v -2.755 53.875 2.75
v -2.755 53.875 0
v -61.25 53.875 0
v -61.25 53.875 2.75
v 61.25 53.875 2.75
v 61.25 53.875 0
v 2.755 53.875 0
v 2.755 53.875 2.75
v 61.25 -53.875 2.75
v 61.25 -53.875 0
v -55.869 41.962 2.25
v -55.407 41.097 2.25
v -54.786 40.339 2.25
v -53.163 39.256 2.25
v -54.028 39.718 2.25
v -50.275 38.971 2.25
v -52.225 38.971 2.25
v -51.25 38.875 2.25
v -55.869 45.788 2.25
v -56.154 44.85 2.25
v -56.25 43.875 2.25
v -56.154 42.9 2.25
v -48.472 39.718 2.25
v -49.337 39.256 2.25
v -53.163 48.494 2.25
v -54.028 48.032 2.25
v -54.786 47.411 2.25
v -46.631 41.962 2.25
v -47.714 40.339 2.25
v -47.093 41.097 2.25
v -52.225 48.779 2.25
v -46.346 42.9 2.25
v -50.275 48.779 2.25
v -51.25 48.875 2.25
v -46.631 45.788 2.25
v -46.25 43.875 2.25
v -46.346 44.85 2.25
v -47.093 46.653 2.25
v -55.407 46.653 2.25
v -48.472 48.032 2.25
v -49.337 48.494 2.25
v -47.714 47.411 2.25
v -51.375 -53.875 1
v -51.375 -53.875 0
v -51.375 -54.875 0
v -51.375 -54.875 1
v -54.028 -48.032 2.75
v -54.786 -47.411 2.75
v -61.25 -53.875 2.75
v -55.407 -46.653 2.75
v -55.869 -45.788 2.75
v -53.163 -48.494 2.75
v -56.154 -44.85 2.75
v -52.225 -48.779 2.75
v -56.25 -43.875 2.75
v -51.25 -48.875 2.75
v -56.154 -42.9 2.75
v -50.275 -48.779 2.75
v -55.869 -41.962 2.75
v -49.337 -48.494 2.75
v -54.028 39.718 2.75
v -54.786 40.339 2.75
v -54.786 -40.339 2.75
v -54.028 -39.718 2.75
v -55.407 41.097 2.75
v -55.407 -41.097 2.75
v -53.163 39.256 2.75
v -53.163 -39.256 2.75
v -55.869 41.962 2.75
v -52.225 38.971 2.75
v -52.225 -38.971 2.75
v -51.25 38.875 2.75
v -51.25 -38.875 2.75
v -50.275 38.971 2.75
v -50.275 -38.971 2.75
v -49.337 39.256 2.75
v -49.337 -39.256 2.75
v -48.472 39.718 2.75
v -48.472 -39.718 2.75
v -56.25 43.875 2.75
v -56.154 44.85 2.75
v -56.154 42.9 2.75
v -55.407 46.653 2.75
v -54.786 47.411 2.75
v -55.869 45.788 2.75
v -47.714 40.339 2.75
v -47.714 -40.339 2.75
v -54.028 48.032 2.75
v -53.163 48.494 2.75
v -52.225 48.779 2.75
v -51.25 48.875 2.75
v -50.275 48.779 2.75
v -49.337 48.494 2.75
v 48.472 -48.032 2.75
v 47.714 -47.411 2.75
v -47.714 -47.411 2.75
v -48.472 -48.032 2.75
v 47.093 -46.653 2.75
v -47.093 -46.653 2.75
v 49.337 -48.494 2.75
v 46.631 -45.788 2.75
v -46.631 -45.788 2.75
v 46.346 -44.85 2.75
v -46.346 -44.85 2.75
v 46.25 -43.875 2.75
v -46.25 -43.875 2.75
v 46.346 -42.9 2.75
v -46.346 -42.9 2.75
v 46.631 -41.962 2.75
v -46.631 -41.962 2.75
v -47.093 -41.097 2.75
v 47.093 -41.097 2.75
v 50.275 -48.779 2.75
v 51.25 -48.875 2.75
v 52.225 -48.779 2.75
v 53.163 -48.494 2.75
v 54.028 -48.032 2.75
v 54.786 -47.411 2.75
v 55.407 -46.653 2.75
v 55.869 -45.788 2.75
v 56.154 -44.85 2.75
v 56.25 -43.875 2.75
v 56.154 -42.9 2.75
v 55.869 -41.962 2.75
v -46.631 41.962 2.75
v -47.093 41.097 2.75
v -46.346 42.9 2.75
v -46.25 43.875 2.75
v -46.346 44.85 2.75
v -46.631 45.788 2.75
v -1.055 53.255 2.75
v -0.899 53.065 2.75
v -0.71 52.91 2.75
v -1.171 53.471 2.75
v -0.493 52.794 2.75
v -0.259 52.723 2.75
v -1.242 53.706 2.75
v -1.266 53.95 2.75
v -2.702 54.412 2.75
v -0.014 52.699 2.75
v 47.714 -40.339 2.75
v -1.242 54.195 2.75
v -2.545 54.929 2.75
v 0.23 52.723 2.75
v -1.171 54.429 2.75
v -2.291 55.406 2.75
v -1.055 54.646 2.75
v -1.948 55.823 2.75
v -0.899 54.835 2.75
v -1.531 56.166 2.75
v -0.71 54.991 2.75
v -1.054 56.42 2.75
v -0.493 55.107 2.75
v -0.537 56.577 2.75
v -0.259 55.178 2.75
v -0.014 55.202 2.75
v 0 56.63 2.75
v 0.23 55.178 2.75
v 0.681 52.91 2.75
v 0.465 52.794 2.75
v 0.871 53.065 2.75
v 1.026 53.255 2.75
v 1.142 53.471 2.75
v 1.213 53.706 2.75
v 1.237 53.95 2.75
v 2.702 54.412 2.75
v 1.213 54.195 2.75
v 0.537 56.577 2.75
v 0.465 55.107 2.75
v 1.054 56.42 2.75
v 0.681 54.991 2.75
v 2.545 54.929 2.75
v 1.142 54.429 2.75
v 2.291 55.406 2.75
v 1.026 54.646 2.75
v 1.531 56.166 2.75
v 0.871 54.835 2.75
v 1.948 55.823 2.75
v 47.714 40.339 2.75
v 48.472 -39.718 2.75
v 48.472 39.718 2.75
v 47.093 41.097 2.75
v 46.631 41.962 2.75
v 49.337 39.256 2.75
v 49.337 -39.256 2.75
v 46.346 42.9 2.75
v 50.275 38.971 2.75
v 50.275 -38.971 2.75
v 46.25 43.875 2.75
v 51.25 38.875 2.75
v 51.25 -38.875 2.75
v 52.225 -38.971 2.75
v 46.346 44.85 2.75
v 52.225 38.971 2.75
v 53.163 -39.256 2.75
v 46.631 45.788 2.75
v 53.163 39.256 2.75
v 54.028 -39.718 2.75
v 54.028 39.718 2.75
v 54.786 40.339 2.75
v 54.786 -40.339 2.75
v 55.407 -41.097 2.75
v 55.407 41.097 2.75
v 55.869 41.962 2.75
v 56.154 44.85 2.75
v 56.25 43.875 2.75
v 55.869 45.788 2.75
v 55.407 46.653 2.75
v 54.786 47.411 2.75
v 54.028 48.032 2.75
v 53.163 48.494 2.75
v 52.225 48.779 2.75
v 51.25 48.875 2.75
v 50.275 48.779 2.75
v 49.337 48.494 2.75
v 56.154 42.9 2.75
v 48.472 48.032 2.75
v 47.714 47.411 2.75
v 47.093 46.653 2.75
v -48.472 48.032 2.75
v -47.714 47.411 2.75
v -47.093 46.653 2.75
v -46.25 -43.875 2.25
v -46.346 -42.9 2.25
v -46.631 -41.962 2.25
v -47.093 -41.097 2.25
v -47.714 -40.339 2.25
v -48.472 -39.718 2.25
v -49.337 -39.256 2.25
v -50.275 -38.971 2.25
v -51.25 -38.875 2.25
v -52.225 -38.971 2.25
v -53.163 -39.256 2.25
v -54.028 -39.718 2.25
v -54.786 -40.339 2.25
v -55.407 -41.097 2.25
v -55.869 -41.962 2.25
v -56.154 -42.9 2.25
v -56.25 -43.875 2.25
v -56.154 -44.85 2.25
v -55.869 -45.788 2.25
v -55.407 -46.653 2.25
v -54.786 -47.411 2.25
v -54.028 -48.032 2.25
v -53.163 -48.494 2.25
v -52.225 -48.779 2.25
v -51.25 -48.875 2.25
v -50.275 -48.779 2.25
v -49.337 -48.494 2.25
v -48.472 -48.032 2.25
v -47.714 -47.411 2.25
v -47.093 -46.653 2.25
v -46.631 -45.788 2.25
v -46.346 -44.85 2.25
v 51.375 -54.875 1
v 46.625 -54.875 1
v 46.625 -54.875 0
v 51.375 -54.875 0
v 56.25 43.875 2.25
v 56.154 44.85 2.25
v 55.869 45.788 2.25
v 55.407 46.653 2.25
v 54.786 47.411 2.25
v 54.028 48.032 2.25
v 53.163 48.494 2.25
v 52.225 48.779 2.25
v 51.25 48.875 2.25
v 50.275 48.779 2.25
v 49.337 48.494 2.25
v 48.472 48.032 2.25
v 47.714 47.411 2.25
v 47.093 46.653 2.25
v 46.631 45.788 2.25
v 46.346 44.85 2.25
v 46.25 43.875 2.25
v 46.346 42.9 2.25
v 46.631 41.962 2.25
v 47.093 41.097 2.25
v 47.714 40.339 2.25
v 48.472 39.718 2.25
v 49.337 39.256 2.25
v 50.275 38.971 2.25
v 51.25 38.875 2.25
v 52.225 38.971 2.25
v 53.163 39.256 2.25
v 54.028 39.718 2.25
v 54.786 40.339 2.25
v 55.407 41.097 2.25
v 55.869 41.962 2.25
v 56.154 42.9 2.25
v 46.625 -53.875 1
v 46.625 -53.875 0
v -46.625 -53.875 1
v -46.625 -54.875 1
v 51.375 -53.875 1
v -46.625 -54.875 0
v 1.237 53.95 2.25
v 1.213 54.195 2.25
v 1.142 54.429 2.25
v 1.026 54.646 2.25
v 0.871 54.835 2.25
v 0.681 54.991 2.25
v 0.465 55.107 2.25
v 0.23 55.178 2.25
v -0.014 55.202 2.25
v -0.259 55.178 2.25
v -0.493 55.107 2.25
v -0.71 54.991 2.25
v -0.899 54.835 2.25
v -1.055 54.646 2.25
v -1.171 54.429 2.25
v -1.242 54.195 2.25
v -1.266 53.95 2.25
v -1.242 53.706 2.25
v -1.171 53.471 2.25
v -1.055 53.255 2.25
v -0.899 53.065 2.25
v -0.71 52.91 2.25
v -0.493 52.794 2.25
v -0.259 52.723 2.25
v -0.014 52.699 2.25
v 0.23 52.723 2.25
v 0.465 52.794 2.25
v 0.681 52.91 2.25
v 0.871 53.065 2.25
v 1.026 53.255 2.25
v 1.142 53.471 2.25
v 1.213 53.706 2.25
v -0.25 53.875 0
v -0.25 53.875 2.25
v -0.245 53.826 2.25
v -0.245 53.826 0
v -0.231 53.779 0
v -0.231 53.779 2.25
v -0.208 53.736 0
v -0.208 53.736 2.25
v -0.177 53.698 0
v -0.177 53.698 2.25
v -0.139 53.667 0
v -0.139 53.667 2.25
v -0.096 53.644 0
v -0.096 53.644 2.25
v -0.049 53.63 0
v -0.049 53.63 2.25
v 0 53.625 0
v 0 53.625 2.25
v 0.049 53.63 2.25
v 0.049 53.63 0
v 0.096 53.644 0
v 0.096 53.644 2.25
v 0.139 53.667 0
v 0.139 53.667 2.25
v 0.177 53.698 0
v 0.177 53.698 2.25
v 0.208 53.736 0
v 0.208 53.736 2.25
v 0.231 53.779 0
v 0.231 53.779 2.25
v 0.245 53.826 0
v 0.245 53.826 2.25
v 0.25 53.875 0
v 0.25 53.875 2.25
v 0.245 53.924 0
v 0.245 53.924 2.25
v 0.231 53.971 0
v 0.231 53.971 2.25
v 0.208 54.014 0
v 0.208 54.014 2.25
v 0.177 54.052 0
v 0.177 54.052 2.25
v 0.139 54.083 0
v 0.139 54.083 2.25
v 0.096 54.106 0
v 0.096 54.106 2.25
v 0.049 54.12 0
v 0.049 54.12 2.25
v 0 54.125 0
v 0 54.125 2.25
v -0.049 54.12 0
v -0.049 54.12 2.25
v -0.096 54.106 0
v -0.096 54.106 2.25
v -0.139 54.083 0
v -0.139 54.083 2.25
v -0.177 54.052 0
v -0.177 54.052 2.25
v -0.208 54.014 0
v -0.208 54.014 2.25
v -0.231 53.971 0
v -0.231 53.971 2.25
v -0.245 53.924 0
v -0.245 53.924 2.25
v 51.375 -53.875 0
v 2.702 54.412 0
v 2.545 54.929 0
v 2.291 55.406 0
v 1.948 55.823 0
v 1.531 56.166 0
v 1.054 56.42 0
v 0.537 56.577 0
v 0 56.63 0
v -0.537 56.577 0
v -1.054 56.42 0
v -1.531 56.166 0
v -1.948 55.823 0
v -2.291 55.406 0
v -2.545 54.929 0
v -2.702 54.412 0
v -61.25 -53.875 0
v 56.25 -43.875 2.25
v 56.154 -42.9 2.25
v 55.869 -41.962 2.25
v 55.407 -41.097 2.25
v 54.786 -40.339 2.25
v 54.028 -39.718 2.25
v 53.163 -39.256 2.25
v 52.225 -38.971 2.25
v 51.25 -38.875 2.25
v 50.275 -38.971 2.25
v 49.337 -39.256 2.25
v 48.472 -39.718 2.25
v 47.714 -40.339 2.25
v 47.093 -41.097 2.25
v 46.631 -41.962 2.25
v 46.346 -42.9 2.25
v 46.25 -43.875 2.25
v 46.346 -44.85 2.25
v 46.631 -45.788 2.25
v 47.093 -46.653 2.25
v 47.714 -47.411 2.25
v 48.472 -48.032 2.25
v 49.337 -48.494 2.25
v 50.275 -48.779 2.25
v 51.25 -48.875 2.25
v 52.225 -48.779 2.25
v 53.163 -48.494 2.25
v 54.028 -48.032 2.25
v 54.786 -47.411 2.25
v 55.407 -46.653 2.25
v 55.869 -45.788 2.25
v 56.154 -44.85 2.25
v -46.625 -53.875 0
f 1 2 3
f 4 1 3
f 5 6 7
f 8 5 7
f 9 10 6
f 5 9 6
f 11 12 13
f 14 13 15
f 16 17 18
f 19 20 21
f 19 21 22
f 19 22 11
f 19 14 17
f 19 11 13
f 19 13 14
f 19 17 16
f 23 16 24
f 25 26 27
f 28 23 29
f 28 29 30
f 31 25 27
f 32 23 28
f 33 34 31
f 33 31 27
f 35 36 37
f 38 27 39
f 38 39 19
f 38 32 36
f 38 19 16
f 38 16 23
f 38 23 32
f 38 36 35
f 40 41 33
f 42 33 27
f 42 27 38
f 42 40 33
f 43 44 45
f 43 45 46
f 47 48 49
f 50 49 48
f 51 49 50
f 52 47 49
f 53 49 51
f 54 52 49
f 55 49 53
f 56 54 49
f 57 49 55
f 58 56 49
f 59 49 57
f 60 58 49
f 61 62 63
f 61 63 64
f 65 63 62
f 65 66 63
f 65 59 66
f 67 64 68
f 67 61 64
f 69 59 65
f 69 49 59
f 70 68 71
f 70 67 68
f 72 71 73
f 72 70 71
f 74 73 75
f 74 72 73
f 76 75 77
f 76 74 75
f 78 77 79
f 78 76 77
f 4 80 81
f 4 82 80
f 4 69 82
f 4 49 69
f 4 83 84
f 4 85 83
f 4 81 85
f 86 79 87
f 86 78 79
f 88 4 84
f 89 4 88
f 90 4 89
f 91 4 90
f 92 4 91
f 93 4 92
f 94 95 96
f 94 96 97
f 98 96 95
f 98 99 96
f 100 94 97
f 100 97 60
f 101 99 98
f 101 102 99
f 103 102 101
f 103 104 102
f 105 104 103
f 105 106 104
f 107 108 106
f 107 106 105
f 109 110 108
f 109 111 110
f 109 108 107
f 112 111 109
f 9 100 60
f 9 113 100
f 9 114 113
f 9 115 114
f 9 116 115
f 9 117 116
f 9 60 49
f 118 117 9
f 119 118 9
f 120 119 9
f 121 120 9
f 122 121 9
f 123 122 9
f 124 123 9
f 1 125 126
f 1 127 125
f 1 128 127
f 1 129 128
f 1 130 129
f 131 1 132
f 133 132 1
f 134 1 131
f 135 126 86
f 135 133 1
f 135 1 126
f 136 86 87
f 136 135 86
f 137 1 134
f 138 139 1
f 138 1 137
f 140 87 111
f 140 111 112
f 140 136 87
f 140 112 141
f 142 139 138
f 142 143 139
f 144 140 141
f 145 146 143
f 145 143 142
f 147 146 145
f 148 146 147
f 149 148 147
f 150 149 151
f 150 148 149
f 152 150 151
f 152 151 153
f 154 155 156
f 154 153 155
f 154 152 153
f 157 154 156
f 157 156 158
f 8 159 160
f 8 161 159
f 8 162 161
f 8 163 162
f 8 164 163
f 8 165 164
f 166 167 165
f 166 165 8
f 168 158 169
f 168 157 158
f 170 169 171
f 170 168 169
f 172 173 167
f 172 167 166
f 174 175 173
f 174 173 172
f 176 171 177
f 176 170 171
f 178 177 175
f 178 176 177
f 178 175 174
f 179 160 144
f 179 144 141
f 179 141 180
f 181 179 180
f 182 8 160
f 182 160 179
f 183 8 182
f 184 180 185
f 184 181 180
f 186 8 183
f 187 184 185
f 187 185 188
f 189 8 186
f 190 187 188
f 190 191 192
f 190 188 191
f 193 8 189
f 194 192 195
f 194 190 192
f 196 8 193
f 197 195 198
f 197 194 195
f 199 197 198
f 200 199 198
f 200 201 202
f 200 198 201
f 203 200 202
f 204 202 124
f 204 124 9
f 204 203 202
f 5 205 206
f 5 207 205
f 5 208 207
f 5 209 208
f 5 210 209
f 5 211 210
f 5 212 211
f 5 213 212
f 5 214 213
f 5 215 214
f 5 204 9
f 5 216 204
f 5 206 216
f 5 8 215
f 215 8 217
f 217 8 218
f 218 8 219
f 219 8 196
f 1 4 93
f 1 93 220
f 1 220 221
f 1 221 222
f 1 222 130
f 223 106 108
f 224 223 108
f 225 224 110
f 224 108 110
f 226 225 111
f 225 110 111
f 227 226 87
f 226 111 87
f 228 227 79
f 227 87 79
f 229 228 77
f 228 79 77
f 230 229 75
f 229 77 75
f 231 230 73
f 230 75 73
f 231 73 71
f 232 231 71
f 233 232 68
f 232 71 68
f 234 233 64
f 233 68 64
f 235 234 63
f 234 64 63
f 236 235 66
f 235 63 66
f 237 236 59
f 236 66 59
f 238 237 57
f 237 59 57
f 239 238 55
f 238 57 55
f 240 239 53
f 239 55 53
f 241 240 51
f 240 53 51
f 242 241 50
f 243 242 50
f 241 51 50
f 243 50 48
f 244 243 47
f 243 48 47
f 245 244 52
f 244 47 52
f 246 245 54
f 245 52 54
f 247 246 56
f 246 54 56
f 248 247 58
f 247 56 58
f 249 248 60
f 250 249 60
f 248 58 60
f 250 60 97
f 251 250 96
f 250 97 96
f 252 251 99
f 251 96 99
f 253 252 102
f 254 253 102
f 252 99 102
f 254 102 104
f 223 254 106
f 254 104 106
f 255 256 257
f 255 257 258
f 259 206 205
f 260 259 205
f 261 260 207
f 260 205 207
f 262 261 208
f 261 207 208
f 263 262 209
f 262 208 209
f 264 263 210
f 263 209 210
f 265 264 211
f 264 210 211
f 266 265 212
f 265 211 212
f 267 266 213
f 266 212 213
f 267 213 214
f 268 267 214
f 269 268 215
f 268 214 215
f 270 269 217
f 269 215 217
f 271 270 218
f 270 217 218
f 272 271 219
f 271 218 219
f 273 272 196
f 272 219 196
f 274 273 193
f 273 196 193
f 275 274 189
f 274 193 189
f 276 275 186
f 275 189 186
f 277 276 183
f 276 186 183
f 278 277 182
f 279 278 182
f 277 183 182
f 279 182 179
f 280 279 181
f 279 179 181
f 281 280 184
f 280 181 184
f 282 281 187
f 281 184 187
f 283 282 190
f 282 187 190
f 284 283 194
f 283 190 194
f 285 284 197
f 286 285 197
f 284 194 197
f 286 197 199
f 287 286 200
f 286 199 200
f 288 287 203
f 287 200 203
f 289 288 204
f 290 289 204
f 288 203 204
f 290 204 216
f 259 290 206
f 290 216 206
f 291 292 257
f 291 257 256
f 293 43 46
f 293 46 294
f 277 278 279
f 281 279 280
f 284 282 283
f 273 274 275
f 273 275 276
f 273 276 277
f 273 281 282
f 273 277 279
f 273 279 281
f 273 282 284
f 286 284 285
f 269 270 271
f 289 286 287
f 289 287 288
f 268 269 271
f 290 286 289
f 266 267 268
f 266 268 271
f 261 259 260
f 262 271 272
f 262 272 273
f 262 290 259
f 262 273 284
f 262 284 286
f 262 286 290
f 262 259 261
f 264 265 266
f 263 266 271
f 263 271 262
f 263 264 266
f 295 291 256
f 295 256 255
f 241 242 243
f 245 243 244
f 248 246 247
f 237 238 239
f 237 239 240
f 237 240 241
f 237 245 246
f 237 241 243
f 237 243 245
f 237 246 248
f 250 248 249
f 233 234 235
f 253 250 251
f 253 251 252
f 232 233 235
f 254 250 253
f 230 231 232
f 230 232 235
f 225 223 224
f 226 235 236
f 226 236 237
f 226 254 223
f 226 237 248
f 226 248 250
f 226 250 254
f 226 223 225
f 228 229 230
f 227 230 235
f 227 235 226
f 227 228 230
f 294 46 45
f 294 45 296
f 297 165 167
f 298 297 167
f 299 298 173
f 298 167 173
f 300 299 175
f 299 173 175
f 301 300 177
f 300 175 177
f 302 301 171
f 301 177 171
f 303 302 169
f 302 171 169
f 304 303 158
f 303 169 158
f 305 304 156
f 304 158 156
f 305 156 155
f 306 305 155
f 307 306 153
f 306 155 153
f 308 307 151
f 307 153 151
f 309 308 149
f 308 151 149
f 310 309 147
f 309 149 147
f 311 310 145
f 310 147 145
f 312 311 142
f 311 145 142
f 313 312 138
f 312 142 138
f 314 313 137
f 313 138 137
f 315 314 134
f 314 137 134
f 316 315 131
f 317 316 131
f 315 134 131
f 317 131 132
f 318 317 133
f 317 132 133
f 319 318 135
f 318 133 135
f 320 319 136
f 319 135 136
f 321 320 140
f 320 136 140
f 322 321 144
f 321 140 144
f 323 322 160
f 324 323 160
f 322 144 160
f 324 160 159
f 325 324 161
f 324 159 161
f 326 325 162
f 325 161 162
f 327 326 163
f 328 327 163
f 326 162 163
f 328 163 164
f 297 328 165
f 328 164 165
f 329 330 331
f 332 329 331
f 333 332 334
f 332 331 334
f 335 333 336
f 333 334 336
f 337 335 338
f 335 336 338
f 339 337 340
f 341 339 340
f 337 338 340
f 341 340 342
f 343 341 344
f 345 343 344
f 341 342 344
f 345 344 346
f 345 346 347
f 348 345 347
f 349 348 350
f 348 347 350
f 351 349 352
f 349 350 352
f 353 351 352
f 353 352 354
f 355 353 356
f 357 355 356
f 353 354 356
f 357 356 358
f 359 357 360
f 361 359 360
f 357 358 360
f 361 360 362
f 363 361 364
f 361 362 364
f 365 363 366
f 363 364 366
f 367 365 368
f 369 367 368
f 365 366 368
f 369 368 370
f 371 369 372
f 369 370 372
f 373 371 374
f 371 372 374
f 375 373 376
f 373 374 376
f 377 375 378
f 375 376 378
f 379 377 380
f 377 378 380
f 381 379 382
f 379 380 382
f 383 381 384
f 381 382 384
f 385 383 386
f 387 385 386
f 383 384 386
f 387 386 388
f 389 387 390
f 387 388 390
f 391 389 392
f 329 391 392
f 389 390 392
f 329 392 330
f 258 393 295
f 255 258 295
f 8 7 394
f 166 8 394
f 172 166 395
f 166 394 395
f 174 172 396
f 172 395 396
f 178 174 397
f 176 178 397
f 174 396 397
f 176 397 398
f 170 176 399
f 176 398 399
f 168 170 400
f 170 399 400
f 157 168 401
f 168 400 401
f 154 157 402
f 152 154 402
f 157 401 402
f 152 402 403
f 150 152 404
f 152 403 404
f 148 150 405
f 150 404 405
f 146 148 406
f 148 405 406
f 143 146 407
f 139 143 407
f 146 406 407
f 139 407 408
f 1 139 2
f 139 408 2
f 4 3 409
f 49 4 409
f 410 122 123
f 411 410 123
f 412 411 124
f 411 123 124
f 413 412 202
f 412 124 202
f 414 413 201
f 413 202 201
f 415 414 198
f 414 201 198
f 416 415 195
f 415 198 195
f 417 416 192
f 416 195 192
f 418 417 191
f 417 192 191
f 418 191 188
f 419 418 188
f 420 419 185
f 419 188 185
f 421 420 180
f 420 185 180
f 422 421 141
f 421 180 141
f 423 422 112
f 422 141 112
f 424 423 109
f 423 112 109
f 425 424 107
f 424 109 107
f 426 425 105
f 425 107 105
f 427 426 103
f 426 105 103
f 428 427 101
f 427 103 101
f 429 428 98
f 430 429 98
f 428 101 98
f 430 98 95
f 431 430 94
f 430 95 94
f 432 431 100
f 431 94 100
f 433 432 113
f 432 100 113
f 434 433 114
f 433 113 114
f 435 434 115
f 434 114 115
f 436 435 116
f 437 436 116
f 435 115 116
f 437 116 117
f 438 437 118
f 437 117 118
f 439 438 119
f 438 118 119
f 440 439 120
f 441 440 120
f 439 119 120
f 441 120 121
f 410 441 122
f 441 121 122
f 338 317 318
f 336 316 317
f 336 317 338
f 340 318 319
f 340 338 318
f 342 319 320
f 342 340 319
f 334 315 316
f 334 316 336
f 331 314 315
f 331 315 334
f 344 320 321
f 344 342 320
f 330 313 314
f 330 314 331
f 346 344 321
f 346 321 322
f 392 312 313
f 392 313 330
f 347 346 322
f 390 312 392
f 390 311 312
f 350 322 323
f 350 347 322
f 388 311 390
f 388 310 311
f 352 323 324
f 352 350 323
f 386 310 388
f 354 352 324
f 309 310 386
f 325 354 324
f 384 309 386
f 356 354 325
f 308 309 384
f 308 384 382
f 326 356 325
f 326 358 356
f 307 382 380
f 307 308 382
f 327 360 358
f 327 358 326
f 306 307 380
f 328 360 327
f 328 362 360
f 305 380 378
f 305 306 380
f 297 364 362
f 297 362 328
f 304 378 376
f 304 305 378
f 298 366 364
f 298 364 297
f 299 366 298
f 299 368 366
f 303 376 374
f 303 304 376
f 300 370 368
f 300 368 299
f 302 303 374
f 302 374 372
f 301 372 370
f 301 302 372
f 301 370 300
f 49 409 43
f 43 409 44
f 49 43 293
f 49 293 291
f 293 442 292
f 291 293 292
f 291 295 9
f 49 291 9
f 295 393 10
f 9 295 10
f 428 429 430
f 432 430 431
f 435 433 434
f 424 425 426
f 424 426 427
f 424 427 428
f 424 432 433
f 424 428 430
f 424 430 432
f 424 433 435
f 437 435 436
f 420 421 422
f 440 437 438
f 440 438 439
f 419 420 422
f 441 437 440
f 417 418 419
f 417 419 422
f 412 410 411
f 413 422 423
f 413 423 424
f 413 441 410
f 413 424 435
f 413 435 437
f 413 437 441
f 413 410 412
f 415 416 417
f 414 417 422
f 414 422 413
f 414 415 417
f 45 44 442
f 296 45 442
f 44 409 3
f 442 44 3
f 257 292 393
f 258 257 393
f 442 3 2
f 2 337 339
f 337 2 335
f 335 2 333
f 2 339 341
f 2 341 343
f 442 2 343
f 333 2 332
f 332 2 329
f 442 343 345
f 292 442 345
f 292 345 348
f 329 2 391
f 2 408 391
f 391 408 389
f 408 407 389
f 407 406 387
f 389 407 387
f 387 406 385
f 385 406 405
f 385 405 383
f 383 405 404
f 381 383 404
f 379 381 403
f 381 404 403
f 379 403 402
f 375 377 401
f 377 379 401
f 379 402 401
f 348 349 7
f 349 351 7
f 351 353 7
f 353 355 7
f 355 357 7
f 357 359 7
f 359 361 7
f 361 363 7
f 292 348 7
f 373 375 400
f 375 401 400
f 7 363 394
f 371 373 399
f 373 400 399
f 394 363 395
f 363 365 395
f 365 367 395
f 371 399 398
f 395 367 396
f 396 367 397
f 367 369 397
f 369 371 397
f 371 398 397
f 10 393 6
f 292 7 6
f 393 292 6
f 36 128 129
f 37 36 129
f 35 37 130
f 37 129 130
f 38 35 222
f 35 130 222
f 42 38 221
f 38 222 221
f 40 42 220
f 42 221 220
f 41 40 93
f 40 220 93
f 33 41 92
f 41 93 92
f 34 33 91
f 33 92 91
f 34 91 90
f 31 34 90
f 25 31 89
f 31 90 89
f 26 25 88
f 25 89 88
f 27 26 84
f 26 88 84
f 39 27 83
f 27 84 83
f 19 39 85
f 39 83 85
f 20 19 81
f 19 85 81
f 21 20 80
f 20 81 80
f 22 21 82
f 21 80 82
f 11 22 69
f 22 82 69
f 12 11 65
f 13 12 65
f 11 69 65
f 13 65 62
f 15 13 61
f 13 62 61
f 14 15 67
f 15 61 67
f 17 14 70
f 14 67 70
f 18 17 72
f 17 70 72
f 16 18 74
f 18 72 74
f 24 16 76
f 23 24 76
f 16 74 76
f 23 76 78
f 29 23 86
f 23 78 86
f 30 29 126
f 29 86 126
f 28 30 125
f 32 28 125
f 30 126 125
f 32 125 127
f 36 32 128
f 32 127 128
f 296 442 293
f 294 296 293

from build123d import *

# Parameters (mm, degrees)
F1_DEPTH = 2.75
F2_W     = 4.75
F2_H     = 1
F3_DEPTH = 1
F4_D     = 0.5
F4_DEPTH = 2.75
F4_TIP   = 0.1502151548
F5_R     = 5
F5_R_2   = 1.2515883102
F5_R_3   = 0.25
F6_DEPTH = 0.5


with BuildPart() as f1:
    # F0 (on Top) → F1 (new body)
    with BuildSketch(Plane.XY):
        Polygon((61.25, -53.875), (61.25, 53.875), (2.7548319194, 53.875), (-2.7548319194, 53.875), (-61.25, 53.875), (-61.25, -53.875), align=None)
        with BuildLine():
            Line((-2.7548319194, 53.875), (2.7548319194, 53.875))
            ThreePointArc((2.7548319194, 53.875), (0, 56.6298319194), (-2.7548319194, 53.875))
        make_face()
    extrude(amount=F1_DEPTH)

    # F2 (on face) → F3 (join)
    with BuildSketch(Plane.XZ.offset(53.875)):
        with Locations((-49, 0.5)):
            Rectangle(F2_W, F2_H)
        with Locations((49, 0.5)):
            Rectangle(F2_W, F2_H)
    extrude(amount=F3_DEPTH)

    # F4
    with Locations(Plane(origin=(0, 0, 0), x_dir=(1, 0, 0), z_dir=(0, 0, -1))):
        with Locations((0, -53.875)):
            Hole(F4_D / 2, depth=F4_DEPTH)
            with Locations((0, 0, -(F4_DEPTH + F4_TIP / 2))):  # 118° drill point
                Cone(0, F4_D / 2, F4_TIP, mode=Mode.SUBTRACT)

    # F5 (on face) → F6 (cut)
    with BuildSketch(Plane.XY.offset(2.75)):
        with Locations((51.25, 43.875)):
            Circle(F5_R)
        with Locations((-0.0143809427, 53.9503525943)):
            Circle(F5_R_2)
        with Locations((0, 53.875)):
            Circle(F5_R_3, mode=Mode.SUBTRACT)
        with Locations((-51.25, 43.875)):
            Circle(F5_R)
        with Locations((51.25, -43.875)):
            Circle(F5_R)
        with Locations((-51.25, -43.875)):
            Circle(F5_R)
    extrude(amount=-F6_DEPTH, mode=Mode.SUBTRACT)


solid = f1.part
